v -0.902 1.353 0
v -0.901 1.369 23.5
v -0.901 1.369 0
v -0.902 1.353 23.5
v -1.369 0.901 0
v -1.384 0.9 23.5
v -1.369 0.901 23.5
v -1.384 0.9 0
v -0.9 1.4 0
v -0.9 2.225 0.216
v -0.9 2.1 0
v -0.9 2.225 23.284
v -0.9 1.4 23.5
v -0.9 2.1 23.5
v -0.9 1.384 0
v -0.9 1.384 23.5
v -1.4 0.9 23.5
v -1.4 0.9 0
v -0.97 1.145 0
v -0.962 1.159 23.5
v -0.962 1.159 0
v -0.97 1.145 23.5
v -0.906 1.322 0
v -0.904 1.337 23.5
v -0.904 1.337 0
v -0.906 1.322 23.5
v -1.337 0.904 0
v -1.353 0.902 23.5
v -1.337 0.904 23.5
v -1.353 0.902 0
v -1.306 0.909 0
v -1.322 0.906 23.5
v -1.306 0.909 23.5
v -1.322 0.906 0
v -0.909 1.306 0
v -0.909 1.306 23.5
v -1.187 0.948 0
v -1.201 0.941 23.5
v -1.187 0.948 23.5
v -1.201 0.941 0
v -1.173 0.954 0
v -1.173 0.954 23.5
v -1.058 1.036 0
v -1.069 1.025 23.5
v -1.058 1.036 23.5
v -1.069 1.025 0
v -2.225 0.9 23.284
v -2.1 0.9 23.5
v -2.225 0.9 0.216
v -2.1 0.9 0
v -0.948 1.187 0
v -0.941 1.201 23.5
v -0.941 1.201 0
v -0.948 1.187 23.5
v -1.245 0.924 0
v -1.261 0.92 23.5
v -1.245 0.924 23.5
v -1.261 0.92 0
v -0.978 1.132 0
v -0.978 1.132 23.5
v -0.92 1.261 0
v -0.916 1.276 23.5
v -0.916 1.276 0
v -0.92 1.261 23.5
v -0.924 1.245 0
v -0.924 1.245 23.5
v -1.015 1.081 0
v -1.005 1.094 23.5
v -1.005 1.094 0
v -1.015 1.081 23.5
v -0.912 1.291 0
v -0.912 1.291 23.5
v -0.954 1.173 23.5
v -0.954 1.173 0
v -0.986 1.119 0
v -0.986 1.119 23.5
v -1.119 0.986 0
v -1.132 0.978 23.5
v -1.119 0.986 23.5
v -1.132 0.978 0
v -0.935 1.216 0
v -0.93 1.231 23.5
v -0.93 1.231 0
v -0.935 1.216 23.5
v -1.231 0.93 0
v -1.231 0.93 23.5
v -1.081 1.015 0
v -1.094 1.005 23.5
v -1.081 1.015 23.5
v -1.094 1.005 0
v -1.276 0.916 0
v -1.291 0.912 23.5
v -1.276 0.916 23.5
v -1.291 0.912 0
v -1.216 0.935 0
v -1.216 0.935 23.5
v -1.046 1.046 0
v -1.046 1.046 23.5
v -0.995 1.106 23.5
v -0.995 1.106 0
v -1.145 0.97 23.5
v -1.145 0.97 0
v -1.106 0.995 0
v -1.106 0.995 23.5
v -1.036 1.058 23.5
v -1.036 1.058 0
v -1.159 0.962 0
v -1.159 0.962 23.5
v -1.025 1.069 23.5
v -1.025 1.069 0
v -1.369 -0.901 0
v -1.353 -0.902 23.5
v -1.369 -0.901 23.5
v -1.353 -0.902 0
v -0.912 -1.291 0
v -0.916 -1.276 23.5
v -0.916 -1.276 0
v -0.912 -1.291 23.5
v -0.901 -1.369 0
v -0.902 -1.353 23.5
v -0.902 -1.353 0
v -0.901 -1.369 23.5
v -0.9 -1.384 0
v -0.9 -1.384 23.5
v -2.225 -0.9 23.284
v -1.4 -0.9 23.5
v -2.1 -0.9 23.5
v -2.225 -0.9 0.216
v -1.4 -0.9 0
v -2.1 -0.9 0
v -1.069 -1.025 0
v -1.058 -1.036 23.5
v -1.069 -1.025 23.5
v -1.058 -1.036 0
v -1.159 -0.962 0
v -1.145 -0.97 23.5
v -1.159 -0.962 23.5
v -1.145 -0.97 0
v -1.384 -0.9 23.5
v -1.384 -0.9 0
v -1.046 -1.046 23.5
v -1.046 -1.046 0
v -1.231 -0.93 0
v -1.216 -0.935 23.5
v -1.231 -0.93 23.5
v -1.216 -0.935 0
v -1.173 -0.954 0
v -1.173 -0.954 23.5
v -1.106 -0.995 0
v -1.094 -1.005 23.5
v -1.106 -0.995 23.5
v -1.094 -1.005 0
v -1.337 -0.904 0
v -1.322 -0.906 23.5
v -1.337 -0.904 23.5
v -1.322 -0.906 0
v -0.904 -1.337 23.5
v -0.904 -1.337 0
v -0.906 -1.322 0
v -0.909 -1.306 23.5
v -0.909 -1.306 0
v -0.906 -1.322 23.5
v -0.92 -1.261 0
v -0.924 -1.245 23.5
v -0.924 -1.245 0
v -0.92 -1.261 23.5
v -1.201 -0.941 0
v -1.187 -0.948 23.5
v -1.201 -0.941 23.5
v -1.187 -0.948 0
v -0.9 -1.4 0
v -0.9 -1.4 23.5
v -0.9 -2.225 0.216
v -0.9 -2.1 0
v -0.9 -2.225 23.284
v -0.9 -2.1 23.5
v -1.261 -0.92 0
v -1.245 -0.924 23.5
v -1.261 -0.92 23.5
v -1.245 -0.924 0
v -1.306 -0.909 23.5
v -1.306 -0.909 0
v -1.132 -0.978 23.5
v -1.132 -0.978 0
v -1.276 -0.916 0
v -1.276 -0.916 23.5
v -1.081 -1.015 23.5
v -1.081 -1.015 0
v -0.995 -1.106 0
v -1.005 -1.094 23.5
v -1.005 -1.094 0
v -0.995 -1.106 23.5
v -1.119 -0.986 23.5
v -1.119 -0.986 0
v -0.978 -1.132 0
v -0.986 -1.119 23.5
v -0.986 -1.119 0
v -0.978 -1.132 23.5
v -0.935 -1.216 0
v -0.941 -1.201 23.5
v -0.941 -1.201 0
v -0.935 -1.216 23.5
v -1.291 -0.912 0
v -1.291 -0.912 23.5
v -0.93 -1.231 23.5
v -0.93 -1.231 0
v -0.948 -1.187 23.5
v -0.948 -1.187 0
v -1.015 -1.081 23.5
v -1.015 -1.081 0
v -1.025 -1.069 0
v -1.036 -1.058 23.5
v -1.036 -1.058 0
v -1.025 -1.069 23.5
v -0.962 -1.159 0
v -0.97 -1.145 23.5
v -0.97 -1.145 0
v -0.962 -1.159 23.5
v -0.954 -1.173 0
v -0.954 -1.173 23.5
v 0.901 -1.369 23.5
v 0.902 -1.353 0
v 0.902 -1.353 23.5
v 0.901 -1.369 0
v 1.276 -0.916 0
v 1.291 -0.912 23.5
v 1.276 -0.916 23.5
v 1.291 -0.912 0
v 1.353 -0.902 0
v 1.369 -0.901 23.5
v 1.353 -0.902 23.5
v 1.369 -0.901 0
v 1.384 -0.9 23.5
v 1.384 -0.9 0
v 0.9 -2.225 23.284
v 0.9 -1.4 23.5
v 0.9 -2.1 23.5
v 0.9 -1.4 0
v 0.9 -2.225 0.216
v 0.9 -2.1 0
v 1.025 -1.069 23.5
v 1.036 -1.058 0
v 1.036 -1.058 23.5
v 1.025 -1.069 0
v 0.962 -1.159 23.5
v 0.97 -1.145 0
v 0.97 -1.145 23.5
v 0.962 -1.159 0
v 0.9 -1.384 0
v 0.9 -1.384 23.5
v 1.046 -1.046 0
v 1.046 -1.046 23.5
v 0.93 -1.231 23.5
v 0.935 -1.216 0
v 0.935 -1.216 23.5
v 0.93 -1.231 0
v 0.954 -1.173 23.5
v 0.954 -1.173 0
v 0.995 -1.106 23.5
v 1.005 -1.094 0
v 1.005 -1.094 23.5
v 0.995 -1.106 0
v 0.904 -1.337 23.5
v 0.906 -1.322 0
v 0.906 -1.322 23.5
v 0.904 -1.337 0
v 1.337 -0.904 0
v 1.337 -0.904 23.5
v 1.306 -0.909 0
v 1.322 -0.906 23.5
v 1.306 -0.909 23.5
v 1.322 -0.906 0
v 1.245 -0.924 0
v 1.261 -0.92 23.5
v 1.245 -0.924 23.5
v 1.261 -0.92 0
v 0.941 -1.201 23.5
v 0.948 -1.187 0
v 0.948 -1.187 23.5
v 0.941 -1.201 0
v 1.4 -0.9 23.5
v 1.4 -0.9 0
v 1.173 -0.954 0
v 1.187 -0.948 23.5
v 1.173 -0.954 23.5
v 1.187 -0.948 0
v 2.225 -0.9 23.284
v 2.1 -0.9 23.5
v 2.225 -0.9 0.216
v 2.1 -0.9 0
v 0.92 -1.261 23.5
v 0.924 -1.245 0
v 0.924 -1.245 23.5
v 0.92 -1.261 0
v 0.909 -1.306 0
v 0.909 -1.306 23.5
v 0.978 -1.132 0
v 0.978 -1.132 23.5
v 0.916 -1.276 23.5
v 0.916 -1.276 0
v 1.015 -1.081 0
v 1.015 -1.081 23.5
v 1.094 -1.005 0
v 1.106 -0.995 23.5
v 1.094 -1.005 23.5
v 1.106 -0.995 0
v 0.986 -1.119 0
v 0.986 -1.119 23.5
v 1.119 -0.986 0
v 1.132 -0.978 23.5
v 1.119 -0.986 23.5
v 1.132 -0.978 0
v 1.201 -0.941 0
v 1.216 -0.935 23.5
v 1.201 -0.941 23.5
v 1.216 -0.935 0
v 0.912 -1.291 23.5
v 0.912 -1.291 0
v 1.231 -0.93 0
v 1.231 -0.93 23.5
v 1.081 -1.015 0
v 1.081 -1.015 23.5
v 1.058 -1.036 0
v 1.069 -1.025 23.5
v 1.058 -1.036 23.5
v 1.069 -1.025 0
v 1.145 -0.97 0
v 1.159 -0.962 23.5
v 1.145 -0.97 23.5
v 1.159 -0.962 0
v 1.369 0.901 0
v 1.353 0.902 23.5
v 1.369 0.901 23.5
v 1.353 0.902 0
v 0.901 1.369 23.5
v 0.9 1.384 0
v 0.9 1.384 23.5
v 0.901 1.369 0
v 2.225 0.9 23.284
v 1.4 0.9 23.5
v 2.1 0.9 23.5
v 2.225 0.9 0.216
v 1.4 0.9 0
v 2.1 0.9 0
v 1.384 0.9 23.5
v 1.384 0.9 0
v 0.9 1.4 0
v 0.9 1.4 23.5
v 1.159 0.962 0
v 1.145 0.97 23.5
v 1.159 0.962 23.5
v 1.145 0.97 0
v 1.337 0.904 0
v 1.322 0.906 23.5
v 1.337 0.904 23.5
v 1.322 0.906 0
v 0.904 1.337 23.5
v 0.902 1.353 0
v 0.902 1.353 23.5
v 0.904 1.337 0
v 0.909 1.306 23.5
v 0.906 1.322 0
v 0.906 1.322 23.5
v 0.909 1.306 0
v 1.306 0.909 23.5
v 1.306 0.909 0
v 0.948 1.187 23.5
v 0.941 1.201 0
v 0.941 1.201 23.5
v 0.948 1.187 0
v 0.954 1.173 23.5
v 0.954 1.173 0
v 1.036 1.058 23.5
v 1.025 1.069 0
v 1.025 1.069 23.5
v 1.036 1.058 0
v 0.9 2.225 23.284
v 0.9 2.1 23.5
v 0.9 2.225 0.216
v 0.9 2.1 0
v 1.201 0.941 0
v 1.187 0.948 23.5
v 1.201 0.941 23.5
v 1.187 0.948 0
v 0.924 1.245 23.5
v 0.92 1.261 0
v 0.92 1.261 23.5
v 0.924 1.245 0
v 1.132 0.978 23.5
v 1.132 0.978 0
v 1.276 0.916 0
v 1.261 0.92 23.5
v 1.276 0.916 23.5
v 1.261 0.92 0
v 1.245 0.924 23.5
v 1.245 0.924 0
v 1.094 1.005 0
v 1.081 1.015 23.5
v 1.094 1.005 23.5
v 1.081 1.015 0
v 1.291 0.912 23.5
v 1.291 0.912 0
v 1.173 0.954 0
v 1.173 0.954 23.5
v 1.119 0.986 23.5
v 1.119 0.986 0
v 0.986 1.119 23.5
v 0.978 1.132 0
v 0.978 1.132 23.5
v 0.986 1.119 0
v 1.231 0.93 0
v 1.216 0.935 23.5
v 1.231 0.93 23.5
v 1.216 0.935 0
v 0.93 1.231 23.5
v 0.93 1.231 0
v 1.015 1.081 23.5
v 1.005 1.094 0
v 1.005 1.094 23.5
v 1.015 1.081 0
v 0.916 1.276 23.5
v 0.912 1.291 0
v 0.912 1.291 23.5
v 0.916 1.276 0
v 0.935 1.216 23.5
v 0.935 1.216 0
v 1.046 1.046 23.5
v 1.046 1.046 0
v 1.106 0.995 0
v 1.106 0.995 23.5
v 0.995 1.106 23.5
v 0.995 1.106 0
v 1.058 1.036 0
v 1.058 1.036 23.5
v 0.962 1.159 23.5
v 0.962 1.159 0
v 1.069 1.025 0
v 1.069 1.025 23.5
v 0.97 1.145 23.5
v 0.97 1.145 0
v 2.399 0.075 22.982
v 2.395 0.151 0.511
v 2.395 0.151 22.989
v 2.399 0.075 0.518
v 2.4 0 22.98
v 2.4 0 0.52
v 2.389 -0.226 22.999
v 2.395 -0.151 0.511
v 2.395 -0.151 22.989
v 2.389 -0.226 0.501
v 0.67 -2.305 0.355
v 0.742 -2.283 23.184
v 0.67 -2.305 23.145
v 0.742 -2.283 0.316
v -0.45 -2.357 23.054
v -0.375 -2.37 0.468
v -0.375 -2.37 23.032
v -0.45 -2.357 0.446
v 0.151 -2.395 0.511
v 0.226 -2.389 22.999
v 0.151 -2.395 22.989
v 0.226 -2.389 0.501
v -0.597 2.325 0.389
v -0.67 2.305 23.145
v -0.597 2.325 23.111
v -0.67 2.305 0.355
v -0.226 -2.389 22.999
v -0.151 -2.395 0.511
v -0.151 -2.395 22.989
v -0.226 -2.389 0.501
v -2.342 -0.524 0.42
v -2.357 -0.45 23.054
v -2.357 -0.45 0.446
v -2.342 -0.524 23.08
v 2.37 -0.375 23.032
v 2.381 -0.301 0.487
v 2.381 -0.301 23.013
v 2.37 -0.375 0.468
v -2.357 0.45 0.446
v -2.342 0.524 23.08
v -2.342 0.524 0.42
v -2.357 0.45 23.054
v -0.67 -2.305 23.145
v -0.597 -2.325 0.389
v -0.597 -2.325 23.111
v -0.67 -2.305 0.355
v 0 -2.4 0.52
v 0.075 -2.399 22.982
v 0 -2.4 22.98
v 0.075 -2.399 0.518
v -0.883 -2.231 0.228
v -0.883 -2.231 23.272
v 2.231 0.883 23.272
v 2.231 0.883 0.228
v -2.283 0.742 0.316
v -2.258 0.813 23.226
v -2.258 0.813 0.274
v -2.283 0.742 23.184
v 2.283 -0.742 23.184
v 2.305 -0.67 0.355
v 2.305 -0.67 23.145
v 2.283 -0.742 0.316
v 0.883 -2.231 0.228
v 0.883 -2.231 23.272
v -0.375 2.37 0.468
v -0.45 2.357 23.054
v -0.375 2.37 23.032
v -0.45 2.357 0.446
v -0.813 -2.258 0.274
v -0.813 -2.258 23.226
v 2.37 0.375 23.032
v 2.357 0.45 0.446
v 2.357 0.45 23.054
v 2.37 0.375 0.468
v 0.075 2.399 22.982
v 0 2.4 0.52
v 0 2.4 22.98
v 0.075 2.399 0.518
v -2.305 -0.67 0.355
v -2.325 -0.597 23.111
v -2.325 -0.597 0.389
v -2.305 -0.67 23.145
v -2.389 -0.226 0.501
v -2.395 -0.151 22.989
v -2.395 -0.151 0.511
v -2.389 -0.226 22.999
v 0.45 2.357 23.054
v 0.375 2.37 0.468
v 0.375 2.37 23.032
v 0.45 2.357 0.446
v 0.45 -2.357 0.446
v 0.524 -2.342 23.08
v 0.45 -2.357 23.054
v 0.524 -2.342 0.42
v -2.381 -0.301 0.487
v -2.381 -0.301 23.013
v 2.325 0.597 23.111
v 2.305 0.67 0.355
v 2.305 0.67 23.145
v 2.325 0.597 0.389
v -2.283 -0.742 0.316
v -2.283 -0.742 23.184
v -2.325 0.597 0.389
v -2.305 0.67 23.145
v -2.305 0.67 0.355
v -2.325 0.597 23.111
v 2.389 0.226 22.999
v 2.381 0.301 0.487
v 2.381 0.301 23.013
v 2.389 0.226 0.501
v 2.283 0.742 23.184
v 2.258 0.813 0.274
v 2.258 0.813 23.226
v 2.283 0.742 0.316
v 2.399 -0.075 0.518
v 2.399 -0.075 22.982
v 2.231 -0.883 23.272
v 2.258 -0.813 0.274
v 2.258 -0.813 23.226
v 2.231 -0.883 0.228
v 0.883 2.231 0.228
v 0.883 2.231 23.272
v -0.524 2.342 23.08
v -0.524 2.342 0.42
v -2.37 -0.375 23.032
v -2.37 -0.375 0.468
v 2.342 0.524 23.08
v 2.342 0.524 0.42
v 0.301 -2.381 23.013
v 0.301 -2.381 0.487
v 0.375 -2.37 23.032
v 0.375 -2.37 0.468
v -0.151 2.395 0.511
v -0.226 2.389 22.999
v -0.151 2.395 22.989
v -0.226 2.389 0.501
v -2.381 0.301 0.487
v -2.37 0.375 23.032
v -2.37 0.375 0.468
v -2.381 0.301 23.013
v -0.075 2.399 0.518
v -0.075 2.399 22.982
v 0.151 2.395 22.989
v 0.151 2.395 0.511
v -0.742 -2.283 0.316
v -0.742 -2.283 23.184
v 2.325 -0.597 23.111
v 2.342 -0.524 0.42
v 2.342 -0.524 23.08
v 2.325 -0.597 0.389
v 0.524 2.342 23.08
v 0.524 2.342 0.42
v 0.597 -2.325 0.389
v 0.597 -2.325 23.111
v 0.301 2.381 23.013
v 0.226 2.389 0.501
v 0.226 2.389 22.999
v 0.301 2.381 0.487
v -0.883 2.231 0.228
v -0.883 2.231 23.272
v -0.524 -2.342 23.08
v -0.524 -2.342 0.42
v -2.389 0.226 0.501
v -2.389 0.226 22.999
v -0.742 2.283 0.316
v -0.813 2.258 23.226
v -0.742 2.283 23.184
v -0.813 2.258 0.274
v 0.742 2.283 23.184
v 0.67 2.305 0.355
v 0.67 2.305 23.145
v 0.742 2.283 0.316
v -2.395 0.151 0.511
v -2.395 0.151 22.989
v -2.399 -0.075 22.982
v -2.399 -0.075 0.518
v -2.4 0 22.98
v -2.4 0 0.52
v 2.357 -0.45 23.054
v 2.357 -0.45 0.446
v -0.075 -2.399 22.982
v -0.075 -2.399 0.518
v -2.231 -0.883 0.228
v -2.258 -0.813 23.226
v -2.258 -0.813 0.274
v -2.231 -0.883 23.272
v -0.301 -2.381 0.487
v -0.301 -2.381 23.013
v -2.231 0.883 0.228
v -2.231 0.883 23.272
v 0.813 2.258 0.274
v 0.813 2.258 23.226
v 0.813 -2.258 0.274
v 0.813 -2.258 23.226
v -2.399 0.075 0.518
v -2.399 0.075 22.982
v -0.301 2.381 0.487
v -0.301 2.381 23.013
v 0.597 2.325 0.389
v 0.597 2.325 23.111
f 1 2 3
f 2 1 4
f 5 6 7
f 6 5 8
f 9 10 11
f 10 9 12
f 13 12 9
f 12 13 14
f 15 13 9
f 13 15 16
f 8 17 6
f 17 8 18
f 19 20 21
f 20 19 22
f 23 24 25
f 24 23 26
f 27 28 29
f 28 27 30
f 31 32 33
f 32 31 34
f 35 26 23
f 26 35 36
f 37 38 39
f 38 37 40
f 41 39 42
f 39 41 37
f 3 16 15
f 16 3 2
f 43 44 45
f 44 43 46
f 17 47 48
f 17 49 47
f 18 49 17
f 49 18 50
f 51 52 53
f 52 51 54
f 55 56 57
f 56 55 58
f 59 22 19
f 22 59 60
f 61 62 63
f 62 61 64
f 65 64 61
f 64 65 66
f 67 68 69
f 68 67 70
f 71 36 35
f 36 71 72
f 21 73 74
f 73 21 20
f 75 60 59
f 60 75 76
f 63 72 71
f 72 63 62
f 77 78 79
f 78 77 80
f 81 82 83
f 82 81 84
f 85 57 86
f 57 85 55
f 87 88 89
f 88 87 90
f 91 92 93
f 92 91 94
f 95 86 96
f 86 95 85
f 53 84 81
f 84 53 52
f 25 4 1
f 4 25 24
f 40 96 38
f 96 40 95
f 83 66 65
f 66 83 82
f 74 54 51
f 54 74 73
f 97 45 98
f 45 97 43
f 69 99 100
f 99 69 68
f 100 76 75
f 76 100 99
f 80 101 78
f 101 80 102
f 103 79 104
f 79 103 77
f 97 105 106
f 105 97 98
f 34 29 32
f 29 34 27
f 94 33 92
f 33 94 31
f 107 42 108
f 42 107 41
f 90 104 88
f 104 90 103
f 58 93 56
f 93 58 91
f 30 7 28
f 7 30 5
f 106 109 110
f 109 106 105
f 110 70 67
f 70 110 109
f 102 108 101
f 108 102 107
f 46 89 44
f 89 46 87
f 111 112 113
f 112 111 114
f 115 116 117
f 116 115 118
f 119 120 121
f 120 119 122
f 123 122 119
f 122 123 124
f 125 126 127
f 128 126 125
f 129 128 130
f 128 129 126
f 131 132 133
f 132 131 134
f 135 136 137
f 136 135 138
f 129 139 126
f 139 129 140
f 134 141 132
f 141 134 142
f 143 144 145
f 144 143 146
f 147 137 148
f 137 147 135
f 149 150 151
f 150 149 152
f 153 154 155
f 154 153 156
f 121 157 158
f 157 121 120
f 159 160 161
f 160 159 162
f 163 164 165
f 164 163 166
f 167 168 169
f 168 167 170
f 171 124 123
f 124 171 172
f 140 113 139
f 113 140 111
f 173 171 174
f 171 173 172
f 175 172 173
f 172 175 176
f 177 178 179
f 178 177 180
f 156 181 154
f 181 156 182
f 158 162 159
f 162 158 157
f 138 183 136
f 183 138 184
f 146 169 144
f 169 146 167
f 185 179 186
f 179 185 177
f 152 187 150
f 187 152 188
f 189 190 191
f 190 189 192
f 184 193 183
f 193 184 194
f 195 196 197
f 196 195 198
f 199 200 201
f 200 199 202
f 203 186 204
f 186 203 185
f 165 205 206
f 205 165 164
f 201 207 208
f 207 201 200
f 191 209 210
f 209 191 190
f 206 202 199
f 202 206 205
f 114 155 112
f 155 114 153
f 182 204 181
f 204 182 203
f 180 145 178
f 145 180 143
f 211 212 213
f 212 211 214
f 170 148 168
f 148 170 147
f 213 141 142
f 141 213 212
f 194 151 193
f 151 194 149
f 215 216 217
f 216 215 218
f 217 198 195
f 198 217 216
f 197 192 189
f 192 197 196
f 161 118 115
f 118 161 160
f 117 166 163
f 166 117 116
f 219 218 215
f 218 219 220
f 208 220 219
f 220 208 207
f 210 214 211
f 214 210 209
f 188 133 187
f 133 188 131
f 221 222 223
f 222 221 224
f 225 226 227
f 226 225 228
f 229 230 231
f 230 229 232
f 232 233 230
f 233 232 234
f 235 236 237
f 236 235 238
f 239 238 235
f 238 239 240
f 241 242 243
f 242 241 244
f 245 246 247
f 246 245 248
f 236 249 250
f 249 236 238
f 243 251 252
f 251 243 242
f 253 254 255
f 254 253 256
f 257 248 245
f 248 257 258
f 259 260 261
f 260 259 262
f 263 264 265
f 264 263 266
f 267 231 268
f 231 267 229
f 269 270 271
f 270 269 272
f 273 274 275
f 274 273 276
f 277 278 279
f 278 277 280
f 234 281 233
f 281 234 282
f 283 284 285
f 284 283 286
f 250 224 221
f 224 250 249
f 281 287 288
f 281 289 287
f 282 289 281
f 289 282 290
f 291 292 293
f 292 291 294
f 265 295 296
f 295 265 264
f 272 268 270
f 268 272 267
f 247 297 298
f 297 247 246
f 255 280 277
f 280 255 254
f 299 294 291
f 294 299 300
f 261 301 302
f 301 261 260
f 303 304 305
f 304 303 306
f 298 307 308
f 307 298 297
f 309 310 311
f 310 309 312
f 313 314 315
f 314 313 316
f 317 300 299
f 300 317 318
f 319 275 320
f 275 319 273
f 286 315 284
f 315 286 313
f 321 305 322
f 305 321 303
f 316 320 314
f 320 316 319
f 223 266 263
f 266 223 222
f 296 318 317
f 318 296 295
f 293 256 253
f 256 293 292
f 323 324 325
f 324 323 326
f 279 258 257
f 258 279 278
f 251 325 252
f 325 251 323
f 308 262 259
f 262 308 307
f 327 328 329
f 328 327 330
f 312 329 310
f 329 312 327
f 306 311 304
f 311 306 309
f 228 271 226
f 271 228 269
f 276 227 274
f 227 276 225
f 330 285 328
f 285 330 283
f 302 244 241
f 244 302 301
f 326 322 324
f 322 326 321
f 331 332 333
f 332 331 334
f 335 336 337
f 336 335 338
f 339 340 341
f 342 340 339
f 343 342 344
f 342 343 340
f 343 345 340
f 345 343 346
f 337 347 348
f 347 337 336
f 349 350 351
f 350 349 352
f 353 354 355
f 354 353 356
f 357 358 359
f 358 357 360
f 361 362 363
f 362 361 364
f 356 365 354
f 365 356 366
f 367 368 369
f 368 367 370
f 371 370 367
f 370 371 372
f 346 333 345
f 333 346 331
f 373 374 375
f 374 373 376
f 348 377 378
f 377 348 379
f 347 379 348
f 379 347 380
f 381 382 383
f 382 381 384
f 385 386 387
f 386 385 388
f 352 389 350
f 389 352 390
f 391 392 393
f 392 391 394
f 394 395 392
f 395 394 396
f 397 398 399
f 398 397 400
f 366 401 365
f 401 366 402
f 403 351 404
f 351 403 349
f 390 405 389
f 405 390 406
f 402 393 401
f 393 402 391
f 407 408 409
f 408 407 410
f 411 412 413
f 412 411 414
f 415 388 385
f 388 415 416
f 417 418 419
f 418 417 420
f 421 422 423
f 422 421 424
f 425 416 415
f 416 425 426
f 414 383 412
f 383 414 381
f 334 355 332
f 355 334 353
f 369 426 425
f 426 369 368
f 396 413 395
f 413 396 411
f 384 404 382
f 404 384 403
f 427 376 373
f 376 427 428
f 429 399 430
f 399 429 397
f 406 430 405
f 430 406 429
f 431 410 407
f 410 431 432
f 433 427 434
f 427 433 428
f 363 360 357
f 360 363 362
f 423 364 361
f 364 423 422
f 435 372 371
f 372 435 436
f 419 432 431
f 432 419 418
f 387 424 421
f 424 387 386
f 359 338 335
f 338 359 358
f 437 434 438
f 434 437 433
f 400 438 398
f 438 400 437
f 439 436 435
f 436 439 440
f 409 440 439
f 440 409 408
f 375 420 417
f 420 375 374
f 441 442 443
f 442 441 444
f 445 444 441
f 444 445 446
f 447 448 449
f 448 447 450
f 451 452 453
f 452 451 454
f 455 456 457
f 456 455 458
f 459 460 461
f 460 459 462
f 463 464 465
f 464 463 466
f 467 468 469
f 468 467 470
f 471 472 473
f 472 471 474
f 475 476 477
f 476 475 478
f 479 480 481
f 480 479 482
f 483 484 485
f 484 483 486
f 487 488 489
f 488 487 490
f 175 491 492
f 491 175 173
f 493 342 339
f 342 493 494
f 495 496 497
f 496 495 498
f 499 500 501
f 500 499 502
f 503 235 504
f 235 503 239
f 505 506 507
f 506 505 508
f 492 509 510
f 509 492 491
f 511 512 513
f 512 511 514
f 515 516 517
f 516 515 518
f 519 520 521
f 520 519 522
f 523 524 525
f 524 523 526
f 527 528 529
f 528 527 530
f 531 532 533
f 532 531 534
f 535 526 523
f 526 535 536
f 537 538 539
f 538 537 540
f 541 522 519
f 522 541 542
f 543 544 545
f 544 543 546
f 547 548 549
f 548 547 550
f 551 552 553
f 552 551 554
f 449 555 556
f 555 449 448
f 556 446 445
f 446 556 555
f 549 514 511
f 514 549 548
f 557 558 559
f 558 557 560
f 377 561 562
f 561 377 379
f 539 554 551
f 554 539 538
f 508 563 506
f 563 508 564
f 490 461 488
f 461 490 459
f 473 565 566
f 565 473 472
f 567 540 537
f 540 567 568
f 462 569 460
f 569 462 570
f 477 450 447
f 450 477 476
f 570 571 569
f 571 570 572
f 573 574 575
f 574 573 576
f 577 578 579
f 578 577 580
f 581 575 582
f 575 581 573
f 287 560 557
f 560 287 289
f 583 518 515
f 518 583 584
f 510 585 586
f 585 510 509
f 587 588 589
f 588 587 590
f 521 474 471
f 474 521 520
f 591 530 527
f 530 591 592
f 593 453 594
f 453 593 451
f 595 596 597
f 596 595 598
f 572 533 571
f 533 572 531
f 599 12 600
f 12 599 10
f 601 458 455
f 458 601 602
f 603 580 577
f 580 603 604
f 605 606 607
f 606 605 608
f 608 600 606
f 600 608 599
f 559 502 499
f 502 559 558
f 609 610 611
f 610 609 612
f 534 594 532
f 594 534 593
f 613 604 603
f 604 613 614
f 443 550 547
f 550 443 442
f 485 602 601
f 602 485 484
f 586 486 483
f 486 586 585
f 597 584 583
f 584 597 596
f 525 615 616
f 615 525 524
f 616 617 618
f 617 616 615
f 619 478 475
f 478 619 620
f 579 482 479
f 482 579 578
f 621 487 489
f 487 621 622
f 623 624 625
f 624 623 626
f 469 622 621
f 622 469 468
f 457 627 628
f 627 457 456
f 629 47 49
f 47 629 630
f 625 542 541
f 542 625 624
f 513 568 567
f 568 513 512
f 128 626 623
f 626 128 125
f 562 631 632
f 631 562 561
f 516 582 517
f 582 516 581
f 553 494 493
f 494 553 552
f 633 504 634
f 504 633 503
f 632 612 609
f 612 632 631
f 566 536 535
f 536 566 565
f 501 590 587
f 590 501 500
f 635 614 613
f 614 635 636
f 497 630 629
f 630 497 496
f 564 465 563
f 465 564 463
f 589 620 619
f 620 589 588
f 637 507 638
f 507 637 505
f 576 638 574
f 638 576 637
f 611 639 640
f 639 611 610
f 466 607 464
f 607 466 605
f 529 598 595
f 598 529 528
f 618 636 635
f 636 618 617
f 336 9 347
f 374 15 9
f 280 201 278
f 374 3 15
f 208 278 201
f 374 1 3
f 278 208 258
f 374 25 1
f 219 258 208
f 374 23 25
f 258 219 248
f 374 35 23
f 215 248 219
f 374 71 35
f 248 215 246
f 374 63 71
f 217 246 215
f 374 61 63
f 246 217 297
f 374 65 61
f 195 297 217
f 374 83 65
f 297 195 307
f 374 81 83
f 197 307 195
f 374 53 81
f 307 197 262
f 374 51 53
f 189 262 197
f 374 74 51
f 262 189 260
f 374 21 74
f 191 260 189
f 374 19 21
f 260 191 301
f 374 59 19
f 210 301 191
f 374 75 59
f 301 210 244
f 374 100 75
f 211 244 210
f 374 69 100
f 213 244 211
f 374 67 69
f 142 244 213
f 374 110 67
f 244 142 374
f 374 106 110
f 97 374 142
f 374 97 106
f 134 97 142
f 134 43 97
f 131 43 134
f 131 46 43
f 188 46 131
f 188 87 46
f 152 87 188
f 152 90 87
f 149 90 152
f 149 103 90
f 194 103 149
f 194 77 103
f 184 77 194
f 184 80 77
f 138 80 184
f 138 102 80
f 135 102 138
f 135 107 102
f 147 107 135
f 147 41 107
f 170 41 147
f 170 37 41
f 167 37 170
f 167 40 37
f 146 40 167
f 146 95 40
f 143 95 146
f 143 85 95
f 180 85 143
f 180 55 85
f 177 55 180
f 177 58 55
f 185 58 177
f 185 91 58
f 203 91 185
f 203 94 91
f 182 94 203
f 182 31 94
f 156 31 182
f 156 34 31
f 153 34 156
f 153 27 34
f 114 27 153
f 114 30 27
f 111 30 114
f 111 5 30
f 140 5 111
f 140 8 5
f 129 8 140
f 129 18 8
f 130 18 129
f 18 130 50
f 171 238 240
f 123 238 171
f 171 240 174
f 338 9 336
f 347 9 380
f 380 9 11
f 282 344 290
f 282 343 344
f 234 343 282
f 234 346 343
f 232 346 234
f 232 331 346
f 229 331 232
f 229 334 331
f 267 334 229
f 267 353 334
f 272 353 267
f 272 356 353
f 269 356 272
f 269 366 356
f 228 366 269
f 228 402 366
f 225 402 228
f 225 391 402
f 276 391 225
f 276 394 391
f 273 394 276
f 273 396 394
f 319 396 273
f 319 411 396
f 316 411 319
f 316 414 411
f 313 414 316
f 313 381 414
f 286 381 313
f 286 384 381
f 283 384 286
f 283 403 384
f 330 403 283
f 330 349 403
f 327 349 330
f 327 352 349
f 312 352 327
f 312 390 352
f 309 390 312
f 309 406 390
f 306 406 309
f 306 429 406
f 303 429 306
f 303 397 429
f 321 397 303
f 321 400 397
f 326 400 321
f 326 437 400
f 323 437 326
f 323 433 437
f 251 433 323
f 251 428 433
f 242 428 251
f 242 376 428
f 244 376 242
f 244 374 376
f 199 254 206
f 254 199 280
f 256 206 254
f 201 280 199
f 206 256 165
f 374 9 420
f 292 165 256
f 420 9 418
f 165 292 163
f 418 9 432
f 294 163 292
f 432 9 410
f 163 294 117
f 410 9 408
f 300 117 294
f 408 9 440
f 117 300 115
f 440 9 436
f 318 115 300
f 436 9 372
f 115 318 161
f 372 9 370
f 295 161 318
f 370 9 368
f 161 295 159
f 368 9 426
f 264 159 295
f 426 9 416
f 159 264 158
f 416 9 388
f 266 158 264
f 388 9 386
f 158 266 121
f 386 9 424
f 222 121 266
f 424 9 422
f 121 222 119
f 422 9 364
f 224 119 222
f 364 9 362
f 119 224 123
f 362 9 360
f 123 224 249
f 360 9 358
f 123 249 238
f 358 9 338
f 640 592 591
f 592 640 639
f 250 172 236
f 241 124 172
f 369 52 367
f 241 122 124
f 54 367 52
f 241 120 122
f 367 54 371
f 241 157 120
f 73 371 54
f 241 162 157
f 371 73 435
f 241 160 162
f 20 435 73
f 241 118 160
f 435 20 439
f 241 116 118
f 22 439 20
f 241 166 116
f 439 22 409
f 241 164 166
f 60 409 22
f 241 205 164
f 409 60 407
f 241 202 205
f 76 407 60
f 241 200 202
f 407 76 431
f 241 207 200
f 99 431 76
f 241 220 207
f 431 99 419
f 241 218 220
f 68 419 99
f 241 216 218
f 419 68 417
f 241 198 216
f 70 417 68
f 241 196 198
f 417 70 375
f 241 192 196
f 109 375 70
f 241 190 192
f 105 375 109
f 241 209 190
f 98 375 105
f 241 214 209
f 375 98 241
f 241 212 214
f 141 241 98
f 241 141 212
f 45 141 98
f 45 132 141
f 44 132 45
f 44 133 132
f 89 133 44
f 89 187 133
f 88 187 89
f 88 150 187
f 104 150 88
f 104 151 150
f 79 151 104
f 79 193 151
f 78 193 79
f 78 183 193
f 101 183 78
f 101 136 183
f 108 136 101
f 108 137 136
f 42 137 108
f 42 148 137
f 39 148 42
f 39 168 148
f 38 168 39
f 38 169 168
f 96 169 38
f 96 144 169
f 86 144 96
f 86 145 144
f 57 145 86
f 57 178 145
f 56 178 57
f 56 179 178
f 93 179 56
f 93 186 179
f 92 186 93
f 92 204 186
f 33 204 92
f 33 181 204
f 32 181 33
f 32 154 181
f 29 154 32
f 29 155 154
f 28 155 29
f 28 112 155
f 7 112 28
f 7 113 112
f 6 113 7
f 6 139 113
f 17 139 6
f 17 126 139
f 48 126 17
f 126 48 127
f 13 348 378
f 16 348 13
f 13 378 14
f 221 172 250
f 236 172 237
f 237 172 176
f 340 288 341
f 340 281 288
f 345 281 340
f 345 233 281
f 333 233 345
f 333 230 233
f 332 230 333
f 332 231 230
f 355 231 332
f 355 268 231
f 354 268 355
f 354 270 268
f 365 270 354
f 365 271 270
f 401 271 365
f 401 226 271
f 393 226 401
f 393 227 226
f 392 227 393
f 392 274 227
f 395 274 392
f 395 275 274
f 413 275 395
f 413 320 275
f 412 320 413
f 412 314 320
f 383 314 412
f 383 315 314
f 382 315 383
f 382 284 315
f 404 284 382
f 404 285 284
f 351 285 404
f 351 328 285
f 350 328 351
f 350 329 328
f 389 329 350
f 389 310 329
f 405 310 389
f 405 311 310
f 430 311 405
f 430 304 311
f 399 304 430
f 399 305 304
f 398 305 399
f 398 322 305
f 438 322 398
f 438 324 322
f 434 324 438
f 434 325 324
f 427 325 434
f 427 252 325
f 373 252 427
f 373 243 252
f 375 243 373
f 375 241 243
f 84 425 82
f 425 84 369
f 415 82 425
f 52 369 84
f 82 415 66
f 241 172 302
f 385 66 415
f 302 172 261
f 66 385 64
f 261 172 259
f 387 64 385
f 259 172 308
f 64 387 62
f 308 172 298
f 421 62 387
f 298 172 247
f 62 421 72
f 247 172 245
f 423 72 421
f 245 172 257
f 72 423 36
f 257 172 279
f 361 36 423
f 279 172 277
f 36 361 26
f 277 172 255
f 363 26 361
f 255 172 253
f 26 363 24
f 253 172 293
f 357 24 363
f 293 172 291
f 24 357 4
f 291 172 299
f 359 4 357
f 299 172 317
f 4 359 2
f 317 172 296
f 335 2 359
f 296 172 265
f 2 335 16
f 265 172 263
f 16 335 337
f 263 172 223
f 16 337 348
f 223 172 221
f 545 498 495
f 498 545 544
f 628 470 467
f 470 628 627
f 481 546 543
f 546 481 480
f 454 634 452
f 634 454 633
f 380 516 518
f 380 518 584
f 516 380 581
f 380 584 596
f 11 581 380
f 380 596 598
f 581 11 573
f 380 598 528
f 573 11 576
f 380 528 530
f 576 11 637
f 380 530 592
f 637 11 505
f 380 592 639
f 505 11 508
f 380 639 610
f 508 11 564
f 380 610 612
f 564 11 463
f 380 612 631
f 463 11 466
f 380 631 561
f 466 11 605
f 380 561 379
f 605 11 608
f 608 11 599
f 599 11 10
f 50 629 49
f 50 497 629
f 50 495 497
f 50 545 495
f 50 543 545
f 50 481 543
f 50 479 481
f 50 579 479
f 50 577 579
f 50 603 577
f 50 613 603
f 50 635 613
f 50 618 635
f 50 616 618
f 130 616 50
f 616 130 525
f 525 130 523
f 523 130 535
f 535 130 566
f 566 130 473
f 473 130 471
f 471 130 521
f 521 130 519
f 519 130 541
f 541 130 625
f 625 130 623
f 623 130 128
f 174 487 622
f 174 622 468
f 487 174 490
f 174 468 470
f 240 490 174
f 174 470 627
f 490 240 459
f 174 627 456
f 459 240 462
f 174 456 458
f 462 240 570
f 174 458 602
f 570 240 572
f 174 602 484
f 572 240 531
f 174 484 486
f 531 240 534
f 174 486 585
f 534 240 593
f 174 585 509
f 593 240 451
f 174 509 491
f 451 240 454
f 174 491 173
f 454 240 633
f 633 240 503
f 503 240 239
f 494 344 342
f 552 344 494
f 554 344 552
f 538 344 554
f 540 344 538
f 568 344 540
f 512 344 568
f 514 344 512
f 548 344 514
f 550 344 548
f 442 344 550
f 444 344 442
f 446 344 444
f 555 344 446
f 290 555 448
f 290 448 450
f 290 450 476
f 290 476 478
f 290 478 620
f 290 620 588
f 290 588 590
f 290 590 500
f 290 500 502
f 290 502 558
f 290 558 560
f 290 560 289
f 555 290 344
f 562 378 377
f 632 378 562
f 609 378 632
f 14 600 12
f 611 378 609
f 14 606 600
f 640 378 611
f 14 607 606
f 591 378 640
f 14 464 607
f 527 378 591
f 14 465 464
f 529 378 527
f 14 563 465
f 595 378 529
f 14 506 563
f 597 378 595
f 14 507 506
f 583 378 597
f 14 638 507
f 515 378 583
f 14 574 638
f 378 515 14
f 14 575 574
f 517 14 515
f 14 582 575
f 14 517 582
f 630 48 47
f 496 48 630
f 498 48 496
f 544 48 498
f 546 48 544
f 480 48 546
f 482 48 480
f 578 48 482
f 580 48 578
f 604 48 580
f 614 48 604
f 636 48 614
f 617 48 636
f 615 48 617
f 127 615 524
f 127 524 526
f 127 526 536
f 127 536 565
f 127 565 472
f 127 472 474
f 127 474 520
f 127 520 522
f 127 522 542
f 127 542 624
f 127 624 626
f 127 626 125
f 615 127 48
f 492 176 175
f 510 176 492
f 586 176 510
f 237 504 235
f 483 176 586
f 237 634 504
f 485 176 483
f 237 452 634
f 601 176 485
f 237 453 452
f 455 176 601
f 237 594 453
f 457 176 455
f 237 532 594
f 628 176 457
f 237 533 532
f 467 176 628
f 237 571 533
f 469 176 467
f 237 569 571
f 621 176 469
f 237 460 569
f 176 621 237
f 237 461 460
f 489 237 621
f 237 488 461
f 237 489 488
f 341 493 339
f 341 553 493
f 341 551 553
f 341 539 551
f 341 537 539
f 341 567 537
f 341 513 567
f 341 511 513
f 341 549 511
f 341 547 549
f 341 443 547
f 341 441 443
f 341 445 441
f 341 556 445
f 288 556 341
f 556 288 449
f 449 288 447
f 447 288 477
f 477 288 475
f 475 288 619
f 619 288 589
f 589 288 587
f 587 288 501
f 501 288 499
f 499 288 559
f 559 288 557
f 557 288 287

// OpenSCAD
eps = 0.001;

modelScale = 1.0;


nrOfUnits = 3;
addScrewHole = false;
rScrewHole = 3.0/2/2.5;


// printability corrections; values should be zero for real object dimensions 
PRINTABLE = 0;
correction_r1 = PRINTABLE ? 0.1 : 0.0;
correction_r2 = PRINTABLE ? 0.1 : 0.0;




// axle
r1 = (4.8/2 + correction_r1)*modelScale;
r2 = (1.0/2 + correction_r2)*modelScale;
offset_r2 = 1.4*modelScale;

axleBaseLength = -0.5*modelScale;
axleLengthUnit = 8.0*modelScale;


// camfer
camferAngle = 60;
camferWidth = 0.3;



module drawCamferSingle()
{
    smallSize = 4*r1;
    translate([0,r1-camferWidth,0]) rotate([camferAngle,0,0]) translate([-smallSize/2,-smallSize/2,-smallSize]) cube([smallSize,smallSize,smallSize]);
}


module drawCamfer()
{
    drawCamferSingle();
    rotate([0,0,90]) drawCamferSingle();
    rotate([0,0,180]) drawCamferSingle();
    rotate([0,0,270]) drawCamferSingle();
}


module drawAxleCutOut(prmLength)
{
    smallSize = 6*r2;   
    translate([-offset_r2,offset_r2,0]) hull()
    {
        translate([0,0,-eps]) cylinder(prmLength+2*eps,r2,r2,$fn=200*modelScale);
        translate([-smallSize,-r2,-eps]) cube([eps,2*r2,prmLength+2*eps]);
        translate([-r2,smallSize,-eps]) cube([2*r2,eps,prmLength+2*eps]);
    }
}    


module drawAxleEx(prmLength)
{	
    echo("prmLength",prmLength);
	difference()
	{
		union()
		{
			cylinder(prmLength,r1,r1,$fn=200*modelScale);
		}
		union()
		{
            drawAxleCutOut(prmLength);
            rotate([0,0,90]) drawAxleCutOut(prmLength);
            rotate([0,0,180]) drawAxleCutOut(prmLength);
            rotate([0,0,270]) drawAxleCutOut(prmLength);
		}
	}
}


module drawAxle()
{
    length = axleBaseLength+nrOfUnits*axleLengthUnit;
    difference()
	{
        union()
        {
            drawAxleEx(length);
        }
        union()
        {
            if (addScrewHole)
            {
                translate([0,0,-2*eps]) cylinder(length+4*eps,rScrewHole,rScrewHole,$fn=50*modelScale);
            }
            drawCamfer();
            translate([0,0,length]) mirror([0,0,1]) drawCamfer();
        }
    }
}


// tests
//drawCamfer();
//drawAxleCutOut(2);


// parts
drawAxle();
